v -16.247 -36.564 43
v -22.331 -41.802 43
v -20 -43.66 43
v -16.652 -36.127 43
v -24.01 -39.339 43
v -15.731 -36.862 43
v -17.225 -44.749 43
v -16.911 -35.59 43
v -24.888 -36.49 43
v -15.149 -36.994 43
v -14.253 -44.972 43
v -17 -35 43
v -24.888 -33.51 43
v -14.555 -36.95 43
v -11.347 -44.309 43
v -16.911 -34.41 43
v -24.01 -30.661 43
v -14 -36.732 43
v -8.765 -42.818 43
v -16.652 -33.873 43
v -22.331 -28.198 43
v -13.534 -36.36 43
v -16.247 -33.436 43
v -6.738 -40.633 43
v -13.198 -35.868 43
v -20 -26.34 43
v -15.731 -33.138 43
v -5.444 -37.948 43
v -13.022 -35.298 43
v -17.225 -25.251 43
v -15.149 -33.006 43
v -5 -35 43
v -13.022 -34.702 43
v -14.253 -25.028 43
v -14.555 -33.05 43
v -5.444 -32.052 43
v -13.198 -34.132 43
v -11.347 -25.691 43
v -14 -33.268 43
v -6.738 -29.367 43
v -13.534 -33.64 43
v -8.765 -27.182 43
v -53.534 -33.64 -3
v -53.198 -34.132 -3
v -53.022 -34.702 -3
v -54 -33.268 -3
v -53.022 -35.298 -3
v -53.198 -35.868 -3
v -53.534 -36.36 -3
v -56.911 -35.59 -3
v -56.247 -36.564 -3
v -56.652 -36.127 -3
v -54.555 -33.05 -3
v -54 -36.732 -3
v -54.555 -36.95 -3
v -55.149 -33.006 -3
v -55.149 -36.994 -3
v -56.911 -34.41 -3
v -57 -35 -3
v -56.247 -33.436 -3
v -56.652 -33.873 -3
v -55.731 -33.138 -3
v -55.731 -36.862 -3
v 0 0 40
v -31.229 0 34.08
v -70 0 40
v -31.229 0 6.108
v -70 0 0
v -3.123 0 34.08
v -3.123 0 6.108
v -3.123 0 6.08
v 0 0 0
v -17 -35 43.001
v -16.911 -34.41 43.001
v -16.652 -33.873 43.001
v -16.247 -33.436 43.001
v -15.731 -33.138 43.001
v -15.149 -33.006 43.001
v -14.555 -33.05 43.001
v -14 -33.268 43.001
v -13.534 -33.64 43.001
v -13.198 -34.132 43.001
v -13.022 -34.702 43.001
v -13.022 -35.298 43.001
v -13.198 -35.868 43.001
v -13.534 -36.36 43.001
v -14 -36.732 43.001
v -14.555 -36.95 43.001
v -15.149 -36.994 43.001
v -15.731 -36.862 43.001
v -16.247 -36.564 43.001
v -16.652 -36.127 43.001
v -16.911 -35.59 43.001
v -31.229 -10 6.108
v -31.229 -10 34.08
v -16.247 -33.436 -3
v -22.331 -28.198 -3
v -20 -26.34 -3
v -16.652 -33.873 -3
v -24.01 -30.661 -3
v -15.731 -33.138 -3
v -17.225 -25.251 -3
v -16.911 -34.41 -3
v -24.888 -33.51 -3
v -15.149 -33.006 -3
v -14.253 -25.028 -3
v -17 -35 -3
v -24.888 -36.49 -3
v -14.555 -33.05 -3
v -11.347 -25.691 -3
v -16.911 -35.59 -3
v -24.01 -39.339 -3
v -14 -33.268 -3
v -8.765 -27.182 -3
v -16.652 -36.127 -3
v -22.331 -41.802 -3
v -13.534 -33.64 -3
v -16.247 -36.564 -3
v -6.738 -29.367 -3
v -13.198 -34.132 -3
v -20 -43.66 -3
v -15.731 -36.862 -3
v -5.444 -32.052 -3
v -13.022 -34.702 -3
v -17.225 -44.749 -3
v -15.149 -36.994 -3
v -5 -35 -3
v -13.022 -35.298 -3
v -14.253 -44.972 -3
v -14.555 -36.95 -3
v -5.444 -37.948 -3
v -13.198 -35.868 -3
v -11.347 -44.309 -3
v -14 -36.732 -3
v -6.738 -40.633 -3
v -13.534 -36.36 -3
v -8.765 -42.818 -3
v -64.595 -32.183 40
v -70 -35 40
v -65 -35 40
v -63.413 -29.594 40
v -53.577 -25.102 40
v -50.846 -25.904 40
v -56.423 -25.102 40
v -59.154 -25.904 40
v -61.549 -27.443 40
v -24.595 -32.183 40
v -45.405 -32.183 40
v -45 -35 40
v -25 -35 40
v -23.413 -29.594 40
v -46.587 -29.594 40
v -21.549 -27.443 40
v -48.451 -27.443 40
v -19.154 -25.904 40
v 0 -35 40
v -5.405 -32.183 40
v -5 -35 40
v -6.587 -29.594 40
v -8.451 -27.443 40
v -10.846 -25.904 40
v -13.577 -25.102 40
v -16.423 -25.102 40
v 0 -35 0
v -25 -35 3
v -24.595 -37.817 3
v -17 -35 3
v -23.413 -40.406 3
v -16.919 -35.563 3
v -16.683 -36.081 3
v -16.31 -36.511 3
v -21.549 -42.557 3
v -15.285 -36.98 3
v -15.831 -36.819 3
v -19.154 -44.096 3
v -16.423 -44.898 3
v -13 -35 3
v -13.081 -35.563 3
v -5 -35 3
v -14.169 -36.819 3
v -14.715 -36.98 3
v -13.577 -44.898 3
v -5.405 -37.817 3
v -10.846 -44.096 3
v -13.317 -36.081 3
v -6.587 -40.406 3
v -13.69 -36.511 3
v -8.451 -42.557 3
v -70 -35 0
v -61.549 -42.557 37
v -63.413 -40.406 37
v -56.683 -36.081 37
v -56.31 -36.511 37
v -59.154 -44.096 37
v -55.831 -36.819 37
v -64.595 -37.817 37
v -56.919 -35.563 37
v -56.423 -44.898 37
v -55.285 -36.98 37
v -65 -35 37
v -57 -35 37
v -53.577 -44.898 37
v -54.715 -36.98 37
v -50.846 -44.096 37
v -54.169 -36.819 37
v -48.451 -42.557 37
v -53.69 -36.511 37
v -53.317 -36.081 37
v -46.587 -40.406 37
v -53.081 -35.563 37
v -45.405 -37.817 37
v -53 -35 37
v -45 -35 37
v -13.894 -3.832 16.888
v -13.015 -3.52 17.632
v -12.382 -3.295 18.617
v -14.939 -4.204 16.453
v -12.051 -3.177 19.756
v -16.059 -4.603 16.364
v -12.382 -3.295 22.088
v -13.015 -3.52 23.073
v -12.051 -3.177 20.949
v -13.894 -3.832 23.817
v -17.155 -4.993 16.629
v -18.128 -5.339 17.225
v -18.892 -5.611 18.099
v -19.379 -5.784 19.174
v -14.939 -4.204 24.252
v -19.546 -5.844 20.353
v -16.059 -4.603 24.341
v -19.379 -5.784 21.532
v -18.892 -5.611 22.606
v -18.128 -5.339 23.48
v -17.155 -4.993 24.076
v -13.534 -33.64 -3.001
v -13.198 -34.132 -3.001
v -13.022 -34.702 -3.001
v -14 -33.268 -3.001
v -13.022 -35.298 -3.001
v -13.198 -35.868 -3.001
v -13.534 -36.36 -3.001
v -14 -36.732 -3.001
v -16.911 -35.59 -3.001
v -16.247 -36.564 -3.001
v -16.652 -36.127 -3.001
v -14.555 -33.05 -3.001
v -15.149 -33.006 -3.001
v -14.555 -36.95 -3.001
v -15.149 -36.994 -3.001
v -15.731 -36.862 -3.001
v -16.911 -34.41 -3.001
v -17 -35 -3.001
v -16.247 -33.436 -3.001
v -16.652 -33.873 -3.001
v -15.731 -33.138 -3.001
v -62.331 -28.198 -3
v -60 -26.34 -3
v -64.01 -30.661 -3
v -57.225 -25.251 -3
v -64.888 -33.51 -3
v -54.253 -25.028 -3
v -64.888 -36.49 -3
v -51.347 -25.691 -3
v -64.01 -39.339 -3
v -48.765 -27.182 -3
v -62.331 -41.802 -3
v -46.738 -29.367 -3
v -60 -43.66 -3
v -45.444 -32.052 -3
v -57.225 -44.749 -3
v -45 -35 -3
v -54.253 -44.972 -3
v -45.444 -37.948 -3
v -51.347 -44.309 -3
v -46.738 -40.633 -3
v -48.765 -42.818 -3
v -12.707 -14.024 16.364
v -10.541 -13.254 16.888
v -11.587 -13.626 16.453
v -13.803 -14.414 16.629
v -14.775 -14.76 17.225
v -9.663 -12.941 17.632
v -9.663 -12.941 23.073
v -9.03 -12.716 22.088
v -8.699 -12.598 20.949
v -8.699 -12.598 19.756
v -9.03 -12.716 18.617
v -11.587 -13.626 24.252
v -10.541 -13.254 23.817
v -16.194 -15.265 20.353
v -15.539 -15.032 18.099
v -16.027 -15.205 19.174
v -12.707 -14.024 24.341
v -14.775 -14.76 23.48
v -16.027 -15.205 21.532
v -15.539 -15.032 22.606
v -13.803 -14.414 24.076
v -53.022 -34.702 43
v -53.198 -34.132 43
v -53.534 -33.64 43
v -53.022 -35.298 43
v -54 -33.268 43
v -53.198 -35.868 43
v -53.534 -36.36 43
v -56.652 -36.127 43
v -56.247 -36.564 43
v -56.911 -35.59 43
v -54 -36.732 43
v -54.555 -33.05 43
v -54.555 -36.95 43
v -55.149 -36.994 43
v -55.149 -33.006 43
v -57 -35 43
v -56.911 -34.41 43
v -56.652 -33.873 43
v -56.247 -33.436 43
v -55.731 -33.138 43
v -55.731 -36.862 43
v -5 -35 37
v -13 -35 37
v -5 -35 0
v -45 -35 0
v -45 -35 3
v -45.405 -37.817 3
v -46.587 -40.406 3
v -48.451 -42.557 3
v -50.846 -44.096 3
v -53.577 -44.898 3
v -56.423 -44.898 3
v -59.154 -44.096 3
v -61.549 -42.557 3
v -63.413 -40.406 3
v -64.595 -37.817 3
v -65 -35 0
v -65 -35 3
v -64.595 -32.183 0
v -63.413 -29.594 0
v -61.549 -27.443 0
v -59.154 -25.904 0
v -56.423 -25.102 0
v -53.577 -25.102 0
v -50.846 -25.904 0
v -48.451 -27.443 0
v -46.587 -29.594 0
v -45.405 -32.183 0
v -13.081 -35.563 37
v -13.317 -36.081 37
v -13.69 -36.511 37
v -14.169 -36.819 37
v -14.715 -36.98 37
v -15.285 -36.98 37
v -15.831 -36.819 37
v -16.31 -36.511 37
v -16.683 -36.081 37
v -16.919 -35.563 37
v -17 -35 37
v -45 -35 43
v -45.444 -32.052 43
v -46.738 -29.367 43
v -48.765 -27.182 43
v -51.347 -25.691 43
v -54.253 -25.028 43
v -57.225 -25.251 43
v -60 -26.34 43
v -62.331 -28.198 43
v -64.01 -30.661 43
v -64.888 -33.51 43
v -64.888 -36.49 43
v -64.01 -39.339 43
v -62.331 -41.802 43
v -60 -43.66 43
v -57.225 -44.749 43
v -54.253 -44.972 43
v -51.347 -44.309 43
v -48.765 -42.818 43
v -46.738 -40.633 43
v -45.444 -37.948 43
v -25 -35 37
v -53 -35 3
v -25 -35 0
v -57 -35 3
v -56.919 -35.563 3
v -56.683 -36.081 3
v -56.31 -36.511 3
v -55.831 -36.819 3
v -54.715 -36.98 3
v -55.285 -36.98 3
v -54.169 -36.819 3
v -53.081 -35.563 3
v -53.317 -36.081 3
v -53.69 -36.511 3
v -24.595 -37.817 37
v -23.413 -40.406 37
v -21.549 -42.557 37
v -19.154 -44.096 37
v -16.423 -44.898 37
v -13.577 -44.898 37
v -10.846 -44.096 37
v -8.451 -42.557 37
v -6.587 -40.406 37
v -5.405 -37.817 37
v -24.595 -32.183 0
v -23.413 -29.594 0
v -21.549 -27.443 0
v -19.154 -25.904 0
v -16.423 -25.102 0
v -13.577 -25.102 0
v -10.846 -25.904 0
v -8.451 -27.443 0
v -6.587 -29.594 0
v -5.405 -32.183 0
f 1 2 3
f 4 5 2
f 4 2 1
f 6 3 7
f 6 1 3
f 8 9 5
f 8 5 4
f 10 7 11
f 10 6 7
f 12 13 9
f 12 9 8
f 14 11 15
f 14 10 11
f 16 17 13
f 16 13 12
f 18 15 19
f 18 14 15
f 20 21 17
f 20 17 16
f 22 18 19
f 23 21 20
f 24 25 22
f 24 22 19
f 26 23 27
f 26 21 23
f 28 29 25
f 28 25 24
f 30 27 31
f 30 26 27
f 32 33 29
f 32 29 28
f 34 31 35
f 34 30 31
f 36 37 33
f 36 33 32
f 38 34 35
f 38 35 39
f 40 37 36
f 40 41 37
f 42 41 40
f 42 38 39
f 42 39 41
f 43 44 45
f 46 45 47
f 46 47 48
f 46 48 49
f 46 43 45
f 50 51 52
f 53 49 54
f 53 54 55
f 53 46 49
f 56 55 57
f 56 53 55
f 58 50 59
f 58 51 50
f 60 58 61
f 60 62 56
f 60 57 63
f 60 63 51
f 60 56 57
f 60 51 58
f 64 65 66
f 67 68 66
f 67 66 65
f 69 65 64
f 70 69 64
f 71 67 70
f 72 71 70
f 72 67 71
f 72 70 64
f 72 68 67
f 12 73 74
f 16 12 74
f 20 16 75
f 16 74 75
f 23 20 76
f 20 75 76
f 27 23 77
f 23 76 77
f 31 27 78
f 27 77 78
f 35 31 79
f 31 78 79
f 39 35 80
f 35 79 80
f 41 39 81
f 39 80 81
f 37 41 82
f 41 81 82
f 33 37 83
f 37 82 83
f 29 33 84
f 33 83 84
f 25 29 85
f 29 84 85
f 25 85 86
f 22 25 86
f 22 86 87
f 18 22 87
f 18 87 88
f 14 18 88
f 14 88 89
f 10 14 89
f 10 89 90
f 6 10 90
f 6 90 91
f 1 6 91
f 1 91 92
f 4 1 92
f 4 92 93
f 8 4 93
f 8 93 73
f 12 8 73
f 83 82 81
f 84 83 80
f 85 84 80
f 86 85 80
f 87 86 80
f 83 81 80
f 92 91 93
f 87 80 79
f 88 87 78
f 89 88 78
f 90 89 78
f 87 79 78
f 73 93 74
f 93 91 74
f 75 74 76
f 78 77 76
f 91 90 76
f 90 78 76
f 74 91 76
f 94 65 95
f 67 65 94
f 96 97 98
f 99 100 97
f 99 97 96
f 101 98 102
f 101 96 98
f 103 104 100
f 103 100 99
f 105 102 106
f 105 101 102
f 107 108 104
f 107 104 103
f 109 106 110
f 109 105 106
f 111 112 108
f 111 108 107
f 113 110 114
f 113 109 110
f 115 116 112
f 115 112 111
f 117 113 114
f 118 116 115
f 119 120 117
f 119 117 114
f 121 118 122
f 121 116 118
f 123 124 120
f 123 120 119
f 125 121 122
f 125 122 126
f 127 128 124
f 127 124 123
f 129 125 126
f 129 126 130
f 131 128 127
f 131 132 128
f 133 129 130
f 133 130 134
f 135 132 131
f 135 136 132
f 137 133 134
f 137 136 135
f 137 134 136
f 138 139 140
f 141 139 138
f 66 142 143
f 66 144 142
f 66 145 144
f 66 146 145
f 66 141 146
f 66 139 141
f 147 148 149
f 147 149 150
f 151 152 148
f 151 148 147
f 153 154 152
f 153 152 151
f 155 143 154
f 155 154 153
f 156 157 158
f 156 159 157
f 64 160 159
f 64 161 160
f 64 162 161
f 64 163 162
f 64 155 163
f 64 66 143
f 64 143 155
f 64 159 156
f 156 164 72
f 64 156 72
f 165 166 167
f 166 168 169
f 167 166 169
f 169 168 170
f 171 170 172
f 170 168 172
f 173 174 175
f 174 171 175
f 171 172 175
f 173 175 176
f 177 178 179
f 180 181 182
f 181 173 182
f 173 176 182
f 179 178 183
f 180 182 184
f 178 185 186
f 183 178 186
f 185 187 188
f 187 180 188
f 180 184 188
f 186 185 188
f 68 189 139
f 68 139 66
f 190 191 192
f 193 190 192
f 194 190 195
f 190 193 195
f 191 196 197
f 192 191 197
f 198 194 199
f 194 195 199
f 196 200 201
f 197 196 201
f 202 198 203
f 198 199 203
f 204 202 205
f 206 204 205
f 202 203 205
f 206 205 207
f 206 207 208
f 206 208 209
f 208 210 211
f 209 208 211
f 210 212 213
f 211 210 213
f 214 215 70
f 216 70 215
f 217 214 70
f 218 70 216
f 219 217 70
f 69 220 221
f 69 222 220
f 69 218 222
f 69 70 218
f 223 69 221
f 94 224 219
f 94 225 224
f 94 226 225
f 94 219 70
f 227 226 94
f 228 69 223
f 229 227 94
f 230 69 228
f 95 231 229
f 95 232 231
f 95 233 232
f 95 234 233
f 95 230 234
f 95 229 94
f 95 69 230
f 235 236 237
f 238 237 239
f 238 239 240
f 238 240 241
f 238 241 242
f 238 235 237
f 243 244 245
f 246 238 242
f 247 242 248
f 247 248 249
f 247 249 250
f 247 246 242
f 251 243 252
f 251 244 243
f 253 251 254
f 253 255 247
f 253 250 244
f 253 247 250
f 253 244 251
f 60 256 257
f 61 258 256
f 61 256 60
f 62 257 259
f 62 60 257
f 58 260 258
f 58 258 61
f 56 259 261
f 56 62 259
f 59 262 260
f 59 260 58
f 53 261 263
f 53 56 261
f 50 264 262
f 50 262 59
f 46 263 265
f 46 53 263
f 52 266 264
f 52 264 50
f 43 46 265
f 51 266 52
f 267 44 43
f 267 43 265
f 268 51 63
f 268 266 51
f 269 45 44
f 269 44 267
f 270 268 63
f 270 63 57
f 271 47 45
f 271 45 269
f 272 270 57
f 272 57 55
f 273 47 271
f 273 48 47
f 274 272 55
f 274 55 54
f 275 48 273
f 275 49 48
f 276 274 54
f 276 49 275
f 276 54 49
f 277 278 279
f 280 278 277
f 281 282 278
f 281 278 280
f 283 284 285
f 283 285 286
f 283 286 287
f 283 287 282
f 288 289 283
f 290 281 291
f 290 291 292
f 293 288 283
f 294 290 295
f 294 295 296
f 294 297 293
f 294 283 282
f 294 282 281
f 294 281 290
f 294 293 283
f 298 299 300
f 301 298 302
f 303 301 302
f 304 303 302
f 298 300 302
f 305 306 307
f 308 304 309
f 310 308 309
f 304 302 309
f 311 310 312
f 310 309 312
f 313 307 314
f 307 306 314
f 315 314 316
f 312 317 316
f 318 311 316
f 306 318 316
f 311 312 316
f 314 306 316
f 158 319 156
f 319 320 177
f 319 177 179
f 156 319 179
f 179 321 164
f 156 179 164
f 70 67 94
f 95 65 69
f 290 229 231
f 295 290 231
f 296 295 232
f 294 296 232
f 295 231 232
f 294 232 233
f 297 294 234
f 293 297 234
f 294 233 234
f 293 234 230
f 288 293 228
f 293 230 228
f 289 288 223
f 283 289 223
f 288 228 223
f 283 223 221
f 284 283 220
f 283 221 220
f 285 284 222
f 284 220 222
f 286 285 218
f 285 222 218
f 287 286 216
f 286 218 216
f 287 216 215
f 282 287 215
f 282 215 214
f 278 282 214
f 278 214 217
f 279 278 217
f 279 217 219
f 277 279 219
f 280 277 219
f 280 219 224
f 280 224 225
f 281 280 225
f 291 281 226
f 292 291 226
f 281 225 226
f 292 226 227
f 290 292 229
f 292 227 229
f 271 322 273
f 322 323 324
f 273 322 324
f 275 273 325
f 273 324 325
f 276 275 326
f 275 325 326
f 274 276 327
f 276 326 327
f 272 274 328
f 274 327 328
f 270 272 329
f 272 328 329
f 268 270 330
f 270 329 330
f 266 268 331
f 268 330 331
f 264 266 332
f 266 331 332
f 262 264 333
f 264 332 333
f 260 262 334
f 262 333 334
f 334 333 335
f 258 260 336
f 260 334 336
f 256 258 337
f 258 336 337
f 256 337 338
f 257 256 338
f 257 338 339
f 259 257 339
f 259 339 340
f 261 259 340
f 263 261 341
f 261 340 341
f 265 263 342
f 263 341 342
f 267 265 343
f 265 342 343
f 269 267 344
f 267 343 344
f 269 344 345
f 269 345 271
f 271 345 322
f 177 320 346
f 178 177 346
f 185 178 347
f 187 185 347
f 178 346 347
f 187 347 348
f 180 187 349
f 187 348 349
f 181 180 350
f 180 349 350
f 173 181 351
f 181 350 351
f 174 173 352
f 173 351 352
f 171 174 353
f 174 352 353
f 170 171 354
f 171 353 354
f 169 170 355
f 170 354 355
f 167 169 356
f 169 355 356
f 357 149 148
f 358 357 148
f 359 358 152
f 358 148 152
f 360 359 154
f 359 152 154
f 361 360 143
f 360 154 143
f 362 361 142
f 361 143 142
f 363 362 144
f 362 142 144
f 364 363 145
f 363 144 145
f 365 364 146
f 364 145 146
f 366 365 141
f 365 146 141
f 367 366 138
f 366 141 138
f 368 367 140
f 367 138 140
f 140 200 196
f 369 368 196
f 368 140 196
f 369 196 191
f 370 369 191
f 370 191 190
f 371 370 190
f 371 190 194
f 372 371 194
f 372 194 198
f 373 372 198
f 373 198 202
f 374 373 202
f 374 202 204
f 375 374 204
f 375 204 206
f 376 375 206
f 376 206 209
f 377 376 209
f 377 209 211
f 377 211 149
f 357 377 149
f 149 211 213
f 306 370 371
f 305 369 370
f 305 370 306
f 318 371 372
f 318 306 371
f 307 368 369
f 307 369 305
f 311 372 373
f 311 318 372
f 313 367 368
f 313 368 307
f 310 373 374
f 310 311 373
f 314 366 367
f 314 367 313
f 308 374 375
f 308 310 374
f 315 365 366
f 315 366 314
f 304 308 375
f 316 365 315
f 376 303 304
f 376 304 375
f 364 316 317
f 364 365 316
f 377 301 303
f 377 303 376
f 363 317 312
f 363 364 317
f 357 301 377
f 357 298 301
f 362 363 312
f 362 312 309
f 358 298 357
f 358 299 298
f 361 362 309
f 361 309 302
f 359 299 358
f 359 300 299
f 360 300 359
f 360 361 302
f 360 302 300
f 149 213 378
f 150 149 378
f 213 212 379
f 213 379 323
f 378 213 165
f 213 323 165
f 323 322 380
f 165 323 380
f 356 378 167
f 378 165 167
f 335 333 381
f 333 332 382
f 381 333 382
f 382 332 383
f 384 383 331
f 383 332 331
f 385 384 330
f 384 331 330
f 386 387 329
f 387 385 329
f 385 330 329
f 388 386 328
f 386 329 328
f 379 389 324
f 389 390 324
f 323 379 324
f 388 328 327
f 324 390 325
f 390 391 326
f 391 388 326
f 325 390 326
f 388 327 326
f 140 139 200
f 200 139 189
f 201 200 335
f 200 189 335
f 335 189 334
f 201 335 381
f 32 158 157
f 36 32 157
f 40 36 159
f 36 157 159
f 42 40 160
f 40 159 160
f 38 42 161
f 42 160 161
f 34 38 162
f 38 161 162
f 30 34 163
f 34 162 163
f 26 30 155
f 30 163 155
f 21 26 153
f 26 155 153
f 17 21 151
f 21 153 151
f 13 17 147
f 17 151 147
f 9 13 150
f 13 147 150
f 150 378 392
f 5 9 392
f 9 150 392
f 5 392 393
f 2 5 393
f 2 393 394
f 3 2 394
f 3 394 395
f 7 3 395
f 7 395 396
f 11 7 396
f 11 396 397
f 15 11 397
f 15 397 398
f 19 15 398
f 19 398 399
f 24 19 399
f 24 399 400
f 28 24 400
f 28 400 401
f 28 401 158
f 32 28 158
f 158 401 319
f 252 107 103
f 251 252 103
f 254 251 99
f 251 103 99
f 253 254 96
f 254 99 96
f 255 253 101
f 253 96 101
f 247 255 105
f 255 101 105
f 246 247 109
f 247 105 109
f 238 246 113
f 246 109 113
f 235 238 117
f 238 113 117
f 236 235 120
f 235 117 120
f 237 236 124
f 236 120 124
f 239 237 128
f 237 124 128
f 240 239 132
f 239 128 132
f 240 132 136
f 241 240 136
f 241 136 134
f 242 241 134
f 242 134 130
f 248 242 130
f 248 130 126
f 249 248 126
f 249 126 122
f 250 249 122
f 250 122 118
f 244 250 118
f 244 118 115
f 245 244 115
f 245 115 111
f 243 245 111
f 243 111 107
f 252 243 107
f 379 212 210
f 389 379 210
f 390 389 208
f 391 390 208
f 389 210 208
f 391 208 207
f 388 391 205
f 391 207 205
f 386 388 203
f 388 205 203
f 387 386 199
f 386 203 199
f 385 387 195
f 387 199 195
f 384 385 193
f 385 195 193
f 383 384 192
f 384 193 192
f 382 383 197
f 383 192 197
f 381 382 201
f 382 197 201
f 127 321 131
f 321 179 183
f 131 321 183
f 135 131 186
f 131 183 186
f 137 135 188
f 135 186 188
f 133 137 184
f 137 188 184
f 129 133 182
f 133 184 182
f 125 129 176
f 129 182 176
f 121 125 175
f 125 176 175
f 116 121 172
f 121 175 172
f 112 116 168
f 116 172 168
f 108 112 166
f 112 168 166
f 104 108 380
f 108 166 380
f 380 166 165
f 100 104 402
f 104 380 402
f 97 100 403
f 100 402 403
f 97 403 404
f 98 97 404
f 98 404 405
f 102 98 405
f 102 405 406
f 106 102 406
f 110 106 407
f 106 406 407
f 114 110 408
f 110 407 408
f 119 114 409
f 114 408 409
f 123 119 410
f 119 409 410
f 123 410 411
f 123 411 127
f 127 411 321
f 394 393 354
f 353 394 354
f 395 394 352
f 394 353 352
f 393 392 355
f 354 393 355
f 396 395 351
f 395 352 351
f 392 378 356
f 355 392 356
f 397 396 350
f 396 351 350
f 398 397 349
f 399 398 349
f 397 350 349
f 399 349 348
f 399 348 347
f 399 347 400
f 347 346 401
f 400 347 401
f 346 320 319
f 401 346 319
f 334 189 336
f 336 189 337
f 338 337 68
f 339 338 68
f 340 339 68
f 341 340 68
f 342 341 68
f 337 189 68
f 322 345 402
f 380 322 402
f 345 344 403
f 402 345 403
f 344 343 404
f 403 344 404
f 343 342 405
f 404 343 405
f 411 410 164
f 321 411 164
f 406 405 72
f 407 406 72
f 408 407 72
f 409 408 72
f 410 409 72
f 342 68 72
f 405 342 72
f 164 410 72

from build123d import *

# Parameters (mm, degrees)
SKETCH2_W                 = 70
SKETCH2_H                 = 35
BOSS_EXTRUDE2_DEPTH       = 40
SKETCH3_W                 = 28.105894453
SKETCH3_H                 = 27.971945797
CUT_EXTRUDE1_DEPTH        = 10
SKETCH4_R                 = 10
CUT_EXTRUDE2_DEPTH        = 3
CUT_EXTRUDE3_START        = -3
SKETCH5_R                 = 10
CUT_EXTRUDE3_DEPTH        = 3
BOSS_EXTRUDE3_DEPTH       = 3
BOSS_EXTRUDE3_DEPTH_BACK  = 3
SKETCH6_R                 = 10
SKETCH7_R                 = 10
BOSS_EXTRUDE5_DEPTH       = 6
SKETCH8_R                 = 2
CUT_EXTRUDE5_DEPTH        = 46
BOSS_EXTRUDE8_DEPTH       = 0.0001
BOSS_EXTRUDE8_DEPTH_BACK  = 46.0001
SKETCH9_R                 = 2
BOSS_EXTRUDE9_DEPTH       = 3
BOSS_EXTRUDE9_DEPTH_BACK  = 3
SKETCH10_R                = 10
BOSS_EXTRUDE10_DEPTH      = 3
BOSS_EXTRUDE10_DEPTH_BACK = 3
SKETCH11_R                = 10
SKETCH12_R                = 2
CUT_EXTRUDE6_DEPTH        = 46
BOSS_EXTRUDE11_DEPTH      = 0.001
BOSS_EXTRUDE11_DEPTH_BACK = 46.001
SKETCH13_R                = 2
BOSS_EXTRUDE12_DEPTH      = 28
SKETCH18_R                = 4
CUT_EXTRUDE11_DEPTH       = 10


with BuildPart() as part:
    # Sketch2 → Boss-Extrude2 (new body)
    with BuildSketch(Plane.XY):
        with Locations((-35, -17.5)):
            Rectangle(SKETCH2_W, SKETCH2_H)
    extrude(amount=BOSS_EXTRUDE2_DEPTH)

    # Sketch3 → Cut-Extrude1 (cut)
    with BuildSketch(Plane(origin=(0, 0, 0), x_dir=(1, 0, 0), z_dir=(0, 1, 0))):
        with Locations((-17.175677586, -20.094439992)):
            Rectangle(SKETCH3_W, SKETCH3_H)
    extrude(amount=-CUT_EXTRUDE1_DEPTH, mode=Mode.SUBTRACT)

    # Sketch4 → Cut-Extrude2 (cut)
    with BuildSketch(Plane.XY.offset(40)):
        with Locations((-15, -35)):
            Circle(SKETCH4_R)
        with Locations((-55, -35)):
            Circle(SKETCH4_R)
    extrude(amount=-CUT_EXTRUDE2_DEPTH, mode=Mode.SUBTRACT)

    # Sketch5 → Cut-Extrude3 (cut)
    with BuildSketch(Plane(origin=(0, 0, 0), x_dir=(-1, 0, 0), z_dir=(0, 0, -1)).offset(CUT_EXTRUDE3_START)):
        with Locations((15, -35)):
            Circle(SKETCH5_R)
        with Locations((55, -35)):
            Circle(SKETCH5_R)
    extrude(amount=CUT_EXTRUDE3_DEPTH, mode=Mode.SUBTRACT)

    # Sketch6 → Boss-Extrude3 (add, two sides: drawn at the far end of the back side and taken through both)
    with BuildSketch(Plane.XY.offset(40).offset(-BOSS_EXTRUDE3_DEPTH_BACK)):
        with Locations((-55, -35)):
            Circle(SKETCH6_R)
    extrude(amount=BOSS_EXTRUDE3_DEPTH + BOSS_EXTRUDE3_DEPTH_BACK)

    # Sketch7 → Boss-Extrude5 (add)
    with BuildSketch(Plane(origin=(0, 0, 3), x_dir=(-1, 0, 0), z_dir=(0, 0, -1))):
        with Locations(Location((55, -35, 0), (0, 0, 180))):
            Circle(SKETCH7_R)
    extrude(amount=BOSS_EXTRUDE5_DEPTH)

    # Sketch8 → Cut-Extrude5 (cut)
    with BuildSketch(Plane(origin=(0, 0, -3), x_dir=(-1, 0, 0), z_dir=(0, 0, -1))):
        with Locations((55, -35)):
            Circle(SKETCH8_R)
    extrude(amount=-CUT_EXTRUDE5_DEPTH, mode=Mode.SUBTRACT)

    # Sketch9 → Boss-Extrude8 (add, two sides: drawn at the far end of the back side and taken through both)
    with BuildSketch(Plane(origin=(0, 0, -3), x_dir=(-1, 0, 0), z_dir=(0, 0, -1)).offset(-BOSS_EXTRUDE8_DEPTH_BACK)):
        with Locations((55, -35)):
            Circle(SKETCH9_R)
    extrude(amount=BOSS_EXTRUDE8_DEPTH + BOSS_EXTRUDE8_DEPTH_BACK)

    # Sketch10 → Boss-Extrude9 (add, two sides: drawn at the far end of the back side and taken through both)
    with BuildSketch(Plane.XY.offset(40).offset(-BOSS_EXTRUDE9_DEPTH_BACK)):
        with Locations((-15, -35)):
            Circle(SKETCH10_R)
    extrude(amount=BOSS_EXTRUDE9_DEPTH + BOSS_EXTRUDE9_DEPTH_BACK)

    # Sketch11 → Boss-Extrude10 (add, two sides: drawn at the far end of the back side and taken through both)
    with BuildSketch(Plane(origin=(0, 0, 0), x_dir=(-1, 0, 0), z_dir=(0, 0, -1)).offset(-BOSS_EXTRUDE10_DEPTH_BACK)):
        with Locations(Location((15, -35, 0), (0, 0, 180))):
            Circle(SKETCH11_R)
    extrude(amount=BOSS_EXTRUDE10_DEPTH + BOSS_EXTRUDE10_DEPTH_BACK)

    # Sketch12 → Cut-Extrude6 (cut)
    with BuildSketch(Plane(origin=(0, 0, -3), x_dir=(-1, 0, 0), z_dir=(0, 0, -1))):
        with Locations((15, -35)):
            Circle(SKETCH12_R)
    extrude(amount=-CUT_EXTRUDE6_DEPTH, mode=Mode.SUBTRACT)

    # Sketch13 → Boss-Extrude11 (add, two sides: drawn at the far end of the back side and taken through both)
    with BuildSketch(Plane(origin=(0, 0, -3), x_dir=(-1, 0, 0), z_dir=(0, 0, -1)).offset(-BOSS_EXTRUDE11_DEPTH_BACK)):
        with Locations((15, -35)):
            Circle(SKETCH13_R)
    extrude(amount=BOSS_EXTRUDE11_DEPTH + BOSS_EXTRUDE11_DEPTH_BACK)

    # Sketch14 → Boss-Extrude12 (add)
    with BuildSketch(Plane(origin=(0, 0, 34.080412891), x_dir=(-1, 0, 0), z_dir=(0, 0, -1))):
        Polygon((3.122730359, 0), (31.228624812, -10), (3.122730359, -10), align=None)
    extrude(amount=BOSS_EXTRUDE12_DEPTH)

    # Sketch18 → Cut-Extrude11 (cut)
    with BuildSketch(Plane(origin=(-0.350891722, 0.986212569, 0), x_dir=(0.9421427910100845, 0.33521181564456864, 0), z_dir=(-0.33521181564456864, 0.9421427910100845, 0))):
        with Locations(Location((-16.374329601, -20.352535637, 0), (0, 0, 180))):
            Circle(SKETCH18_R)
    extrude(amount=-CUT_EXTRUDE11_DEPTH, mode=Mode.SUBTRACT)


solid = part.part
